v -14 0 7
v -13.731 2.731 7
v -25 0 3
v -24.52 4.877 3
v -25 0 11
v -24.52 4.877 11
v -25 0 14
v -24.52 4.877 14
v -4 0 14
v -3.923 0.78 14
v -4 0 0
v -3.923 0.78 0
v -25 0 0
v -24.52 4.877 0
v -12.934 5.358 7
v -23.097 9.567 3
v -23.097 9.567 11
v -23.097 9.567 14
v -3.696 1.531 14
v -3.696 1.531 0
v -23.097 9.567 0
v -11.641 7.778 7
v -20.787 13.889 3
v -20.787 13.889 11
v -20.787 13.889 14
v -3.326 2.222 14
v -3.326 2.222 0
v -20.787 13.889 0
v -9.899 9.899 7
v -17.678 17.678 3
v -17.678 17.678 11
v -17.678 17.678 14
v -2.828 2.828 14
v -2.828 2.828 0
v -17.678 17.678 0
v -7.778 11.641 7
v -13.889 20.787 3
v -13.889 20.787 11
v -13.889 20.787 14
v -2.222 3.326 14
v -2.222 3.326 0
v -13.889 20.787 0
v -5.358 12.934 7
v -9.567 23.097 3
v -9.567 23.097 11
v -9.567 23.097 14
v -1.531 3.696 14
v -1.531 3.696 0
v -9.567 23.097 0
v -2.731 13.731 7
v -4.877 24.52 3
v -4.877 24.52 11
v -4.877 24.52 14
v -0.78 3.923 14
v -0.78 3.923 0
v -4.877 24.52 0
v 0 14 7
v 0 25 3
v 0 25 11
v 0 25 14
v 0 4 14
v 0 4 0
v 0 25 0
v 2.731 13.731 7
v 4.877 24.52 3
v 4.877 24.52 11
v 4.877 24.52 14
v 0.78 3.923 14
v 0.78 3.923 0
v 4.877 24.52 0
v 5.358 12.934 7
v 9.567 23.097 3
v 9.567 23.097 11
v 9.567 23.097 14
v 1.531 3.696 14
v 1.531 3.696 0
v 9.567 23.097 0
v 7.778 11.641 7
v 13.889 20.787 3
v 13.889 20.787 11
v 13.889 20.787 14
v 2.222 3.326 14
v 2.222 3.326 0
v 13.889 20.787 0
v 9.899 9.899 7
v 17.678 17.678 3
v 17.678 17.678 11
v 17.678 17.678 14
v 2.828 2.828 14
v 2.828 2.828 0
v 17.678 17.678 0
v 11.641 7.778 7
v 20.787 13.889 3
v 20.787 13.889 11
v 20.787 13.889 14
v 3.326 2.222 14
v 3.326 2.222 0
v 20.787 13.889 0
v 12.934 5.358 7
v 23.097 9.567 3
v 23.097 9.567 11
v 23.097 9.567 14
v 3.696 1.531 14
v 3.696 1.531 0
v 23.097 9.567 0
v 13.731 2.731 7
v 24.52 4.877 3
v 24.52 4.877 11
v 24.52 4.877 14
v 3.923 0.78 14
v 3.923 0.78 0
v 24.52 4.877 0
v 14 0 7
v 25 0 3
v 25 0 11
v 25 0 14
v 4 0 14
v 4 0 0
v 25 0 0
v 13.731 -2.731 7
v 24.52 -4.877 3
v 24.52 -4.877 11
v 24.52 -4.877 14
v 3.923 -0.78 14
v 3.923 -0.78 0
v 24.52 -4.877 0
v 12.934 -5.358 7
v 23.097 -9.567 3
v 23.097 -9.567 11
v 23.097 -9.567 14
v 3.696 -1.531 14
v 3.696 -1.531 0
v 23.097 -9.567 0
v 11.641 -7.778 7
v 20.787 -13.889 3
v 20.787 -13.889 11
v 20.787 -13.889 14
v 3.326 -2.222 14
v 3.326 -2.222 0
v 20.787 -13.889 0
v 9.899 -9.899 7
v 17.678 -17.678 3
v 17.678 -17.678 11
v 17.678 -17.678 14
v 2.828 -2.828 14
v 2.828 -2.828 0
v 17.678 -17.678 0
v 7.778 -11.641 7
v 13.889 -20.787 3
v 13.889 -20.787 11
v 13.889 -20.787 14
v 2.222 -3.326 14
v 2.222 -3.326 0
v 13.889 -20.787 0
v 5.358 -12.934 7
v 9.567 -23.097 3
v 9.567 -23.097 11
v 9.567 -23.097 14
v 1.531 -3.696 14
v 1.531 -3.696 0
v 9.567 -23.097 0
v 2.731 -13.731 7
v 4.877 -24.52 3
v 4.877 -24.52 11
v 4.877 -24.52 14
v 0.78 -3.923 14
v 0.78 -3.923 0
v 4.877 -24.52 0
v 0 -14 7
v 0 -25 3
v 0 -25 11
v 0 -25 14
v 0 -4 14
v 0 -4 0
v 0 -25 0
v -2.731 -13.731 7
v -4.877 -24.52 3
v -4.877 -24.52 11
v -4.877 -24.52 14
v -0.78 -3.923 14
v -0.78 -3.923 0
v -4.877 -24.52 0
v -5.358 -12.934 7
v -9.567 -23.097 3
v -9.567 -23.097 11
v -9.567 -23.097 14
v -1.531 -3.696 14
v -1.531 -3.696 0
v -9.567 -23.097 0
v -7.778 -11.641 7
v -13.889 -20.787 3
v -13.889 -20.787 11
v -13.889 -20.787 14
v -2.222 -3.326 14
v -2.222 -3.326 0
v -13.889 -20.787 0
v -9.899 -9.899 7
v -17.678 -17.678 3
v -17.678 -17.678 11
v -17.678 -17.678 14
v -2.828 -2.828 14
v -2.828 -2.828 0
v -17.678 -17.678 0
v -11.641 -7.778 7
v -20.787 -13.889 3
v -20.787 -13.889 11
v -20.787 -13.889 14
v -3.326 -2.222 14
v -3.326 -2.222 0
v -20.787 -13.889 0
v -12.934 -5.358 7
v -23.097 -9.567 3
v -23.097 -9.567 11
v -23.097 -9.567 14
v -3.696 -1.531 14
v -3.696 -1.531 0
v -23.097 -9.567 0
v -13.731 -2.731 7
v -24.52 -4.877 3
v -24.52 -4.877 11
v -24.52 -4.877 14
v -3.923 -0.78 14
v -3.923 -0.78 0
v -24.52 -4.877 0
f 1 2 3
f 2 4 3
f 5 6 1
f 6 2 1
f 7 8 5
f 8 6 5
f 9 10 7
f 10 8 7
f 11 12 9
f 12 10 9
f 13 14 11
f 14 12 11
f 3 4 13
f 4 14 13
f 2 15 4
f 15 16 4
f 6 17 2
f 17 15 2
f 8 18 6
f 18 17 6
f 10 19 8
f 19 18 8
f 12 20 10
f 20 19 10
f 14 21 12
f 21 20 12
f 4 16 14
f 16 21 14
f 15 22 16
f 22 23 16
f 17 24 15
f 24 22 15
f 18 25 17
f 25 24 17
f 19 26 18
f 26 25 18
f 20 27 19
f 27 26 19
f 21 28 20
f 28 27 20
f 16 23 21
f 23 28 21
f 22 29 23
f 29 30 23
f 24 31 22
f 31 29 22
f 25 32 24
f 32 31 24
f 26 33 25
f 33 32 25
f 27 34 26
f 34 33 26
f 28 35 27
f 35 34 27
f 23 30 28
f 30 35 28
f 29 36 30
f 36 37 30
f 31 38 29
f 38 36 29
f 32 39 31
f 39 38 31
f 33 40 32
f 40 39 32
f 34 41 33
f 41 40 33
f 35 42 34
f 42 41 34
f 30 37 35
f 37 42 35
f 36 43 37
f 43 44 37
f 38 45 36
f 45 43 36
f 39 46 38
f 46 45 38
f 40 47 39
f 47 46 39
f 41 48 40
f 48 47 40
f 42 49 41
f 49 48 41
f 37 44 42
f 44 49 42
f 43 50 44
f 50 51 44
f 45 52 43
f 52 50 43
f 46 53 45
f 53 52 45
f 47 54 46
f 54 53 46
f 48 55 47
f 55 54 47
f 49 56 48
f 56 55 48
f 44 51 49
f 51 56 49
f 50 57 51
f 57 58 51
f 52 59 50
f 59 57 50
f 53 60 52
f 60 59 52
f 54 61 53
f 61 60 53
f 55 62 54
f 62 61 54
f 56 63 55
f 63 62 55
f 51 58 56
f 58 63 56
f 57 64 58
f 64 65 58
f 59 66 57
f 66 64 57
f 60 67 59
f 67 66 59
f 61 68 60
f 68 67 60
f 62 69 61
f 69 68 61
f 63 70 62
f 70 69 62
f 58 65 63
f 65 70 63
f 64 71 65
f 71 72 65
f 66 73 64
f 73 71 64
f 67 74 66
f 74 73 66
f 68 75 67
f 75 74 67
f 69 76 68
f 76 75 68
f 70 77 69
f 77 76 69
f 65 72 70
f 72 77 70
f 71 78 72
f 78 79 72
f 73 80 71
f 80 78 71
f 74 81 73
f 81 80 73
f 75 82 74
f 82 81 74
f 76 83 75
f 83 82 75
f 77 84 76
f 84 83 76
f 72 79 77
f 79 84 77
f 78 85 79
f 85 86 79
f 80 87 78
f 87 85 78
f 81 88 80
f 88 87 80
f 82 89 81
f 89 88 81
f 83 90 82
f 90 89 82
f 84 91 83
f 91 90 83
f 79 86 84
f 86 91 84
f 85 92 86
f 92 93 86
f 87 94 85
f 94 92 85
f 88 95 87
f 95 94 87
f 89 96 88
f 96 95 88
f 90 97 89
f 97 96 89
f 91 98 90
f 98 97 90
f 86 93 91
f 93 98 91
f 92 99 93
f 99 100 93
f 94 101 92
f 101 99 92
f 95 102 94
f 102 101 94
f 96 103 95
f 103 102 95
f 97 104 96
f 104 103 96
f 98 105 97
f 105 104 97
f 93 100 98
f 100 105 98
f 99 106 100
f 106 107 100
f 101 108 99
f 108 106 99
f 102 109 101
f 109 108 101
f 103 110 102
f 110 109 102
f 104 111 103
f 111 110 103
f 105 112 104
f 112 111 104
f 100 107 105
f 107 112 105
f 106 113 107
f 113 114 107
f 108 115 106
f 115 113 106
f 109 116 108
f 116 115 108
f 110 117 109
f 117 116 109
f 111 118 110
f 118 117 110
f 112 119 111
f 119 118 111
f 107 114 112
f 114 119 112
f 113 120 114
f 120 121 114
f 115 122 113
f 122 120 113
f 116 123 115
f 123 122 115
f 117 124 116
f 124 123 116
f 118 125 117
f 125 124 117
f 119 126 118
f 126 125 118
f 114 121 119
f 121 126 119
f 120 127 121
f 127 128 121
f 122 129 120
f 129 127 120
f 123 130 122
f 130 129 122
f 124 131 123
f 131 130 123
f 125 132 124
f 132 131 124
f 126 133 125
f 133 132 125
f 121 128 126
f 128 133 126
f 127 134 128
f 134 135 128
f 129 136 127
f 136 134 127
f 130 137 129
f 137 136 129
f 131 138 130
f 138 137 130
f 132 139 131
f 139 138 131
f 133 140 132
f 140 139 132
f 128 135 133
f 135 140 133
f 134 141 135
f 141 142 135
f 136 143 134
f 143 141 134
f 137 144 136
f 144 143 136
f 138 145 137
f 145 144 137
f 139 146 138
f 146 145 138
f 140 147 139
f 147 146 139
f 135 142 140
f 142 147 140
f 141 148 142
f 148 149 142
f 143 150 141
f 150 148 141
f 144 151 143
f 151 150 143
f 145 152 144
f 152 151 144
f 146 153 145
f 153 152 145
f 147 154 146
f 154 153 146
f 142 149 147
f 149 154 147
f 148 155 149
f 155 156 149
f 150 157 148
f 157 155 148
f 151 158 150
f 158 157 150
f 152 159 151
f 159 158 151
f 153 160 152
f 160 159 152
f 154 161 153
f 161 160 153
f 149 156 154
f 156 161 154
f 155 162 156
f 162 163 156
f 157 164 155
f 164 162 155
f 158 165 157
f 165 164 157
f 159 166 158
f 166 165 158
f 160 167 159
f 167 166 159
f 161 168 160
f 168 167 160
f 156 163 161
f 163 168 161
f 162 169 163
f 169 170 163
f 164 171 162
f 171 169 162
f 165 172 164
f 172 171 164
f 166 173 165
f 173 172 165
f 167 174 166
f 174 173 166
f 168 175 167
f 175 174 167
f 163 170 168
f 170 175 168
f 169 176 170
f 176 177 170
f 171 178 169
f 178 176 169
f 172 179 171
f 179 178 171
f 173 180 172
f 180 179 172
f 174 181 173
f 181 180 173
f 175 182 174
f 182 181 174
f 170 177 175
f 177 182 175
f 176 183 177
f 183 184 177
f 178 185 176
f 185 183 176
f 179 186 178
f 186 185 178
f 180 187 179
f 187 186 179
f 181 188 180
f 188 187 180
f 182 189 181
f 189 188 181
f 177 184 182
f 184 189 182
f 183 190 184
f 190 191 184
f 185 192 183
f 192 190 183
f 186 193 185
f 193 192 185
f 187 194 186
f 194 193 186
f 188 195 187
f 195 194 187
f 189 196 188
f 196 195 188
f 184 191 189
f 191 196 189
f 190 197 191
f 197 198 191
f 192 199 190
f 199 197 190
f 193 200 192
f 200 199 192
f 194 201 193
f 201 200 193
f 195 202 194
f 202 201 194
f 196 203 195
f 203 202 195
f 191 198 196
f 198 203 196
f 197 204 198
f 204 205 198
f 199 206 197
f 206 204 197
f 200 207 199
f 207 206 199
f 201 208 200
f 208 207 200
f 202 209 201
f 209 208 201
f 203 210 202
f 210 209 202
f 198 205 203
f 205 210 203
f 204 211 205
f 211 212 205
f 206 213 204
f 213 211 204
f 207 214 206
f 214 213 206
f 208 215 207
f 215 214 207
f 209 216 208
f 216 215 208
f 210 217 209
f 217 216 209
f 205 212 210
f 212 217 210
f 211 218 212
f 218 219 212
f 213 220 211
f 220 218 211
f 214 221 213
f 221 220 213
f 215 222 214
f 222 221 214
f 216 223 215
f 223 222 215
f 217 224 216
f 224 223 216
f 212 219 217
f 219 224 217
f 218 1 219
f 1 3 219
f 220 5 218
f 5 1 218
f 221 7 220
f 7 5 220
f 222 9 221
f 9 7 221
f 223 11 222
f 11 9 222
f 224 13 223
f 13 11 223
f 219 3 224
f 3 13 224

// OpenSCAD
$fn = 32;

// ----------------------------------------------------------------------
// Revolved part: V-groove pulley R25
// ----------------------------------------------------------------------

// --- parameters (mm) ---
bore_r = 4;               // bore radius
rim_r = 25;               // rim radius
rim_t = 14;               // rim width
groove_r = 14;            // groove root radius
groove_w = 4;             // groove half width
revolve_angle = 360;      // revolve sweep, degrees

bore_d = 2 * bore_r;
rim_d = 2 * rim_r;
groove_d = 2 * groove_r;

profile = [[4, 0], [25, 0], [25, 3], [14, 7], [25, 11], [25, 14], [4, 14]];  // primary outline, 7 points, counter clockwise

// --- the one profile operation ---
rotate_extrude(angle = revolve_angle) polygon(points = profile);
